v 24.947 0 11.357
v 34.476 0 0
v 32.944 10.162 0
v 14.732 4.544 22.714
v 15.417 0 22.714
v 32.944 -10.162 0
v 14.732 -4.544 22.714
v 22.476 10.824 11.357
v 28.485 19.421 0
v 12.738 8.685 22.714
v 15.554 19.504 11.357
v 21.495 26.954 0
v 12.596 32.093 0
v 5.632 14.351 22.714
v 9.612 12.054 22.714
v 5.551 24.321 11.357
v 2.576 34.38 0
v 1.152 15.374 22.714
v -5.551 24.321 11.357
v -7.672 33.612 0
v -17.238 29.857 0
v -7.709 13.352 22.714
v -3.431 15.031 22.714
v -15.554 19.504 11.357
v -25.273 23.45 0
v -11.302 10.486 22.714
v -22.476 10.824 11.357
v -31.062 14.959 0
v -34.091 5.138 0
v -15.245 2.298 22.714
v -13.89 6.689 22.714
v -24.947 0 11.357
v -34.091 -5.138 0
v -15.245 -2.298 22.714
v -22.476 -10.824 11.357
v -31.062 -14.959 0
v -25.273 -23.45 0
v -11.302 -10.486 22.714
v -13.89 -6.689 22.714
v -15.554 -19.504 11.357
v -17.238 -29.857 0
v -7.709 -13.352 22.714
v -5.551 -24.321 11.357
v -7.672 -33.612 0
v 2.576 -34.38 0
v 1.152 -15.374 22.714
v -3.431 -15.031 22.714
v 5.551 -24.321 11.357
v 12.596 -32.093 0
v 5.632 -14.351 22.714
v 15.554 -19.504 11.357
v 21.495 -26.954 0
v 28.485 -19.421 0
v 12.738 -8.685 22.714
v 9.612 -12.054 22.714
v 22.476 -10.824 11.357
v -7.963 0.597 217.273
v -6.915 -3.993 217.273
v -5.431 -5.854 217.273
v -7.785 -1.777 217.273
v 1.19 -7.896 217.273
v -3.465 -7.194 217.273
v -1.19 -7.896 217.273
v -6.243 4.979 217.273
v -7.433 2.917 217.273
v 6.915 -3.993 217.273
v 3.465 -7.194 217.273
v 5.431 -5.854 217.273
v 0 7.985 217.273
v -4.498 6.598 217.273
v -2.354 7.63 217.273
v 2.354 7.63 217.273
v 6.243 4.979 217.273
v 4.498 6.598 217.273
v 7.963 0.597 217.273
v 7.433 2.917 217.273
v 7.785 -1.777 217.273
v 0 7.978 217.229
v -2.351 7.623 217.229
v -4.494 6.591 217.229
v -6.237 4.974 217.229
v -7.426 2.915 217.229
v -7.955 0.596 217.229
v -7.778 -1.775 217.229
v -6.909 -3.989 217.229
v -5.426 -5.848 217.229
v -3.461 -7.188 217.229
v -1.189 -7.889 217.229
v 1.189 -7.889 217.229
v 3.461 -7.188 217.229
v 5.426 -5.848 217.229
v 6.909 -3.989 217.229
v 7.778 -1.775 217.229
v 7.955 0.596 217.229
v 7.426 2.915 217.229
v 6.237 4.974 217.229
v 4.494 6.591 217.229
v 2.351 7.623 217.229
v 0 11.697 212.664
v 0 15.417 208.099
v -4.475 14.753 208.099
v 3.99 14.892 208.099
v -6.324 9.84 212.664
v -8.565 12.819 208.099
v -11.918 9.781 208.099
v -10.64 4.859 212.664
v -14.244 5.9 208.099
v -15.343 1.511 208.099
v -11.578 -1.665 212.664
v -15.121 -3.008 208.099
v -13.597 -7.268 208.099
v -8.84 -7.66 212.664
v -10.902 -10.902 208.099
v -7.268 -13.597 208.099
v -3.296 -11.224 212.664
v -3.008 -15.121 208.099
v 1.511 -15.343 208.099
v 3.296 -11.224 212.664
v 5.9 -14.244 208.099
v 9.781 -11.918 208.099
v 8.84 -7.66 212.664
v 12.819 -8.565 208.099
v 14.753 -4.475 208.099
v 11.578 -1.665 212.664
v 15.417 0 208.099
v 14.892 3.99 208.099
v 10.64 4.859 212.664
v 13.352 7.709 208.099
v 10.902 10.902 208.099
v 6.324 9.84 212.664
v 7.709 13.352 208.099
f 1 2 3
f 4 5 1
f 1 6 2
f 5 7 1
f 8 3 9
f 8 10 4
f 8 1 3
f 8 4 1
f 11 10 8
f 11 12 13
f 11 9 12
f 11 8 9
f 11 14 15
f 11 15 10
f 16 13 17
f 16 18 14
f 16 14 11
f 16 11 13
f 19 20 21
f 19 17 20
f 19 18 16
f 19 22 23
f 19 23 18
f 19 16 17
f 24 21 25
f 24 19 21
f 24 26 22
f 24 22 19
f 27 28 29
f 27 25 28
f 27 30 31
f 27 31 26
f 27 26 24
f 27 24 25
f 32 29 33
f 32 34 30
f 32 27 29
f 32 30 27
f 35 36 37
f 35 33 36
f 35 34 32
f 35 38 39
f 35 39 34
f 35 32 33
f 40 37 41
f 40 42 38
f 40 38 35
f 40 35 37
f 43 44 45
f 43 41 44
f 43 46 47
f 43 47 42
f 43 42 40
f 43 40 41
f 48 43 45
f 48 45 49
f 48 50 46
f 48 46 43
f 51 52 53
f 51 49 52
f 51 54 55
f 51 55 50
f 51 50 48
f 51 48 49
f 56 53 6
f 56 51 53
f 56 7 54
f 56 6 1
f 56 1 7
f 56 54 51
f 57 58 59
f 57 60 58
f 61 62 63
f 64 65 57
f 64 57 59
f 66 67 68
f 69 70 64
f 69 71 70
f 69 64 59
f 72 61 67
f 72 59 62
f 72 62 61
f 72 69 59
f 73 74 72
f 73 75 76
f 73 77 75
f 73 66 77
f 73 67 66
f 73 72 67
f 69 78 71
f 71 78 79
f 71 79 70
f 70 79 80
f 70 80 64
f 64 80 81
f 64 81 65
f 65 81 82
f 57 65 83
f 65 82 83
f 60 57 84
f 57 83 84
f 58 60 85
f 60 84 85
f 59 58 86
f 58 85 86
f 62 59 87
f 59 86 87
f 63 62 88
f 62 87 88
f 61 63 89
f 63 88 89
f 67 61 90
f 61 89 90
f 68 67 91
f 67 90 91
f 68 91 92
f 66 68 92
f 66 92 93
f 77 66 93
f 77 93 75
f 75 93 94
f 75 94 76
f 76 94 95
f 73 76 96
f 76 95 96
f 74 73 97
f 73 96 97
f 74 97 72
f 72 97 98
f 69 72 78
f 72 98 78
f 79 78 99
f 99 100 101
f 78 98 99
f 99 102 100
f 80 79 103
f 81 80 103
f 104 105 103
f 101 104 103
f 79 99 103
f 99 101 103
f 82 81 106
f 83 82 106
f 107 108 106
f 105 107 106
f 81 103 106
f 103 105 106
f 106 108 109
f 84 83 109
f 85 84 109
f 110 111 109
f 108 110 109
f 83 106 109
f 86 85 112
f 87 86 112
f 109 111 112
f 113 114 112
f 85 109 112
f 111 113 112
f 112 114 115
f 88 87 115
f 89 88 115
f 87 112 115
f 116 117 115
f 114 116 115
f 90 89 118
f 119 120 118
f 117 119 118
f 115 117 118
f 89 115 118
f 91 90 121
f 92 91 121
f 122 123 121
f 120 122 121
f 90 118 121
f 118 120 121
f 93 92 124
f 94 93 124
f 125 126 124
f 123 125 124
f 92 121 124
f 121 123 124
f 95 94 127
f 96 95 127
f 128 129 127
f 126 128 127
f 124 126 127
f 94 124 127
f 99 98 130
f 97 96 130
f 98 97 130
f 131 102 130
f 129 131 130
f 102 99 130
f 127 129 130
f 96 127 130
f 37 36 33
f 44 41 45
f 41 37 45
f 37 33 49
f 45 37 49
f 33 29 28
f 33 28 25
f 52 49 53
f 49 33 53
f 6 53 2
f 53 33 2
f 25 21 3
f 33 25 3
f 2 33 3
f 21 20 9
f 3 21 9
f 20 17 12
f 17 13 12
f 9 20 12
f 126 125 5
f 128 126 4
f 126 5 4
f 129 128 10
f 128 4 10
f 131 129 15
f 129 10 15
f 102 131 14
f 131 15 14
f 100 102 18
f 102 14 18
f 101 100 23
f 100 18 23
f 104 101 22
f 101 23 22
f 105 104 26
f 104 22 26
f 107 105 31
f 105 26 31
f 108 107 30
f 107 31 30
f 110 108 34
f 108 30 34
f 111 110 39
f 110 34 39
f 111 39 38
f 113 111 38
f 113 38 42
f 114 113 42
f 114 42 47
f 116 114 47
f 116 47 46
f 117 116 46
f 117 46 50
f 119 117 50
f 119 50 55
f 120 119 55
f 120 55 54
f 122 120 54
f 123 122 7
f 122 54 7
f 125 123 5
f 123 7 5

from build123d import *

# Parameters (mm, degrees)
F0_R     = 34.4760551883
F1_DEPTH = 25.4
F1_TAPER = 40
F2_R     = 15.4170929596
F3_DEPTH = 217.2726094723


with BuildPart() as f1:
    # F0 (on Top) → F1 (new body)
    with BuildSketch(Plane.XY):
        Circle(F0_R)
    extrude(amount=F1_DEPTH, taper=F1_TAPER)

    # F2 (on Top) → F3 (join)
    with BuildSketch(Plane.XY):
        Circle(F2_R)
    extrude(amount=F3_DEPTH)

    # F4 (on Right) → F5 (revolve, cut)
    with BuildSketch(Plane.YZ):
        Polygon((9.2559680343, 224.6120274067), (7.9776421189, 217.2289937735), (15.5677124858, 207.9138755798), (24.6758013964, 207.9138755798), (24.6758013964, 224.6120274067), align=None)
    revolve(axis=Axis((0, 0, 227.7240306139), (0, 0, 1)), mode=Mode.SUBTRACT)


solid = f1.part
